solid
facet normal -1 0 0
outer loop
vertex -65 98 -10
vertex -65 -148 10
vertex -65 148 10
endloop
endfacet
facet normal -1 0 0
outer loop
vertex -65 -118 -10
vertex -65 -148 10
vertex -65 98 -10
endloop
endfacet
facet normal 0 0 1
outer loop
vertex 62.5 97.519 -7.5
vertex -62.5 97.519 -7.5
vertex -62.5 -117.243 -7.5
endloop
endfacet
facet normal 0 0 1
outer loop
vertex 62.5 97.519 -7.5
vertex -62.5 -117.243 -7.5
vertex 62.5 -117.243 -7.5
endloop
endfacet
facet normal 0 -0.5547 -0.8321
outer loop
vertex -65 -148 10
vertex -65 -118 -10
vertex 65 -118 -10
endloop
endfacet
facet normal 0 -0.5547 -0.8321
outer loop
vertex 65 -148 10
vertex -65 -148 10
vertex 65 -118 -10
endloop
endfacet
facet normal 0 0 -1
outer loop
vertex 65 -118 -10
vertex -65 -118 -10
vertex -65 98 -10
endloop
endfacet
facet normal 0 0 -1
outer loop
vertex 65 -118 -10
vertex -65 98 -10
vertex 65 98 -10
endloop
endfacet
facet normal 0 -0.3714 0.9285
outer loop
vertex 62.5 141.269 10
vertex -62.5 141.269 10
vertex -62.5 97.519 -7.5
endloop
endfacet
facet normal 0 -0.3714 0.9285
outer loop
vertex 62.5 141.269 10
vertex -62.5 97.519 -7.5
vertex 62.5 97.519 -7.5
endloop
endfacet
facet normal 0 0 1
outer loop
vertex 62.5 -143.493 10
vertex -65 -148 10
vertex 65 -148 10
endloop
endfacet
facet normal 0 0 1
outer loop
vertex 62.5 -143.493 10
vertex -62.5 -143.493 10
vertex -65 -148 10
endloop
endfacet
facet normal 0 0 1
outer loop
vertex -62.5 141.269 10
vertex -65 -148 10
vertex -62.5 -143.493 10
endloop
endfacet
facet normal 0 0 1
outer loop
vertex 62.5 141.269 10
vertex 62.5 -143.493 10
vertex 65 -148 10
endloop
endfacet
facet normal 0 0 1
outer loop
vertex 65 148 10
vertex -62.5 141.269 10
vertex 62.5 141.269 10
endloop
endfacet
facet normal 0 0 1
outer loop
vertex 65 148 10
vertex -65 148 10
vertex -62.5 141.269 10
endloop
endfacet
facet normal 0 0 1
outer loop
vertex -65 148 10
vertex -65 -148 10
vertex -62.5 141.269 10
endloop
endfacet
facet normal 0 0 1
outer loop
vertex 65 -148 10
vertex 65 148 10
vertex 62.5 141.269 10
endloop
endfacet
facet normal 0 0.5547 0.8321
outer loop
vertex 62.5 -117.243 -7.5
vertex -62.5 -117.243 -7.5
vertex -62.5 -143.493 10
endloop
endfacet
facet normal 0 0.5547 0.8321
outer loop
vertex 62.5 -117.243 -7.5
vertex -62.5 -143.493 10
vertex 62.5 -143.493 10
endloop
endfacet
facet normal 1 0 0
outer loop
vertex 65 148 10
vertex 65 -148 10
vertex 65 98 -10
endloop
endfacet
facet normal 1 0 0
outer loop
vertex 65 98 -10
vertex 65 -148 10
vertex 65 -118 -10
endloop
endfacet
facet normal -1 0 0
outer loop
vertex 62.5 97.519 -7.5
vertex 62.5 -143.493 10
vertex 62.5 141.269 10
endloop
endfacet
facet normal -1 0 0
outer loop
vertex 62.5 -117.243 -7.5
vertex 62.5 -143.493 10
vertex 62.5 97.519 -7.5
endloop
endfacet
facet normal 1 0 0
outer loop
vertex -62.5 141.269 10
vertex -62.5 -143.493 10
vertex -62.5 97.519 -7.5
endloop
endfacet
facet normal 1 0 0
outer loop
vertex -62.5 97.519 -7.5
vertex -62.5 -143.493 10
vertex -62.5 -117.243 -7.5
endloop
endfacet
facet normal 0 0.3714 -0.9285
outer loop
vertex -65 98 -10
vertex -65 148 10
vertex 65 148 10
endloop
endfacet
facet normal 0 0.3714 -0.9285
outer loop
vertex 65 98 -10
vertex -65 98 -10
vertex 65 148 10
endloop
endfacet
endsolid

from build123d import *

# Parameters (mm, degrees)
F0_W     = 130
F0_H     = 296
F1_DEPTH = 10
F2_SIZE2 = 29.99999
F2_SIZE  = 19.99999
F3_SIZE2 = 19.99999
F3_SIZE  = 49.99999
F4_T     = 2.5


# Not quite as in the source:
# - a fillet or chamfer is up to 0.001 mm smaller than in the source, because OpenCascade refuses the exact size
# - a shell that OpenCascade refuses in one call is made with other operations: the cavity is built on its own and cut out


with BuildPart() as f1:
    # F0 (on Top) → F1 (new body, symmetric)
    with BuildSketch(Plane.XY):
        Rectangle(F0_W, F0_H)
    extrude(amount=F1_DEPTH, both=True)

    # F2 (size 20 and 30 in the source; OpenCascade refuses exactly that, so slightly less here)
    f2_edges = [f1.edges().sort_by_distance(p)[0] for p in [
        (0, -148, -10),
    ]]
    f2_side = f1.faces().sort_by_distance((0, -148, 0))[0]
    chamfer(f2_edges, length=F2_SIZE, length2=F2_SIZE2, reference=f2_side)

    # F3 (size 50 and 20 in the source; OpenCascade refuses exactly that, so slightly less here)
    f3_edges = [f1.edges().sort_by_distance(p)[0] for p in [
        (0, 148, -10),
    ]]
    f3_side = f1.faces().sort_by_distance((0, 14.999995, -10))[0]
    chamfer(f3_edges, length=F3_SIZE, length2=F3_SIZE2, reference=f3_side)

    # F4: shell of thickness 2.5, made by hand


with BuildPart() as f4_core1:
    # F4_t2: copy of F1
    add(f1.part)

    # the walls: a layer under each face that stays
    f4_faces = [f4_core1.faces().sort_by_distance(p)[0] for p in [
        (65, 0, 0),
        (0, -10, -10),
        (0, 123.000005, -5e-06),
        (0, -133.000005, -5e-06),
        (0, 148, 9.999995),
        (0, -148, 9.999995),
        (-65, 0, 0),
    ]]
    thicken(f4_faces, amount=-F4_T, mode=Mode.SUBTRACT)


with BuildPart() as f1_1:
    add(f1.part)

    # what is left inside the walls is the cavity
    f4_cavity = [f4_core1.part.solids().sort_by_distance(p)[0] for p in [
        (0, -48.572528, 9.975),
    ]]
    add(f4_cavity, mode=Mode.SUBTRACT)


solid = f1_1.part
